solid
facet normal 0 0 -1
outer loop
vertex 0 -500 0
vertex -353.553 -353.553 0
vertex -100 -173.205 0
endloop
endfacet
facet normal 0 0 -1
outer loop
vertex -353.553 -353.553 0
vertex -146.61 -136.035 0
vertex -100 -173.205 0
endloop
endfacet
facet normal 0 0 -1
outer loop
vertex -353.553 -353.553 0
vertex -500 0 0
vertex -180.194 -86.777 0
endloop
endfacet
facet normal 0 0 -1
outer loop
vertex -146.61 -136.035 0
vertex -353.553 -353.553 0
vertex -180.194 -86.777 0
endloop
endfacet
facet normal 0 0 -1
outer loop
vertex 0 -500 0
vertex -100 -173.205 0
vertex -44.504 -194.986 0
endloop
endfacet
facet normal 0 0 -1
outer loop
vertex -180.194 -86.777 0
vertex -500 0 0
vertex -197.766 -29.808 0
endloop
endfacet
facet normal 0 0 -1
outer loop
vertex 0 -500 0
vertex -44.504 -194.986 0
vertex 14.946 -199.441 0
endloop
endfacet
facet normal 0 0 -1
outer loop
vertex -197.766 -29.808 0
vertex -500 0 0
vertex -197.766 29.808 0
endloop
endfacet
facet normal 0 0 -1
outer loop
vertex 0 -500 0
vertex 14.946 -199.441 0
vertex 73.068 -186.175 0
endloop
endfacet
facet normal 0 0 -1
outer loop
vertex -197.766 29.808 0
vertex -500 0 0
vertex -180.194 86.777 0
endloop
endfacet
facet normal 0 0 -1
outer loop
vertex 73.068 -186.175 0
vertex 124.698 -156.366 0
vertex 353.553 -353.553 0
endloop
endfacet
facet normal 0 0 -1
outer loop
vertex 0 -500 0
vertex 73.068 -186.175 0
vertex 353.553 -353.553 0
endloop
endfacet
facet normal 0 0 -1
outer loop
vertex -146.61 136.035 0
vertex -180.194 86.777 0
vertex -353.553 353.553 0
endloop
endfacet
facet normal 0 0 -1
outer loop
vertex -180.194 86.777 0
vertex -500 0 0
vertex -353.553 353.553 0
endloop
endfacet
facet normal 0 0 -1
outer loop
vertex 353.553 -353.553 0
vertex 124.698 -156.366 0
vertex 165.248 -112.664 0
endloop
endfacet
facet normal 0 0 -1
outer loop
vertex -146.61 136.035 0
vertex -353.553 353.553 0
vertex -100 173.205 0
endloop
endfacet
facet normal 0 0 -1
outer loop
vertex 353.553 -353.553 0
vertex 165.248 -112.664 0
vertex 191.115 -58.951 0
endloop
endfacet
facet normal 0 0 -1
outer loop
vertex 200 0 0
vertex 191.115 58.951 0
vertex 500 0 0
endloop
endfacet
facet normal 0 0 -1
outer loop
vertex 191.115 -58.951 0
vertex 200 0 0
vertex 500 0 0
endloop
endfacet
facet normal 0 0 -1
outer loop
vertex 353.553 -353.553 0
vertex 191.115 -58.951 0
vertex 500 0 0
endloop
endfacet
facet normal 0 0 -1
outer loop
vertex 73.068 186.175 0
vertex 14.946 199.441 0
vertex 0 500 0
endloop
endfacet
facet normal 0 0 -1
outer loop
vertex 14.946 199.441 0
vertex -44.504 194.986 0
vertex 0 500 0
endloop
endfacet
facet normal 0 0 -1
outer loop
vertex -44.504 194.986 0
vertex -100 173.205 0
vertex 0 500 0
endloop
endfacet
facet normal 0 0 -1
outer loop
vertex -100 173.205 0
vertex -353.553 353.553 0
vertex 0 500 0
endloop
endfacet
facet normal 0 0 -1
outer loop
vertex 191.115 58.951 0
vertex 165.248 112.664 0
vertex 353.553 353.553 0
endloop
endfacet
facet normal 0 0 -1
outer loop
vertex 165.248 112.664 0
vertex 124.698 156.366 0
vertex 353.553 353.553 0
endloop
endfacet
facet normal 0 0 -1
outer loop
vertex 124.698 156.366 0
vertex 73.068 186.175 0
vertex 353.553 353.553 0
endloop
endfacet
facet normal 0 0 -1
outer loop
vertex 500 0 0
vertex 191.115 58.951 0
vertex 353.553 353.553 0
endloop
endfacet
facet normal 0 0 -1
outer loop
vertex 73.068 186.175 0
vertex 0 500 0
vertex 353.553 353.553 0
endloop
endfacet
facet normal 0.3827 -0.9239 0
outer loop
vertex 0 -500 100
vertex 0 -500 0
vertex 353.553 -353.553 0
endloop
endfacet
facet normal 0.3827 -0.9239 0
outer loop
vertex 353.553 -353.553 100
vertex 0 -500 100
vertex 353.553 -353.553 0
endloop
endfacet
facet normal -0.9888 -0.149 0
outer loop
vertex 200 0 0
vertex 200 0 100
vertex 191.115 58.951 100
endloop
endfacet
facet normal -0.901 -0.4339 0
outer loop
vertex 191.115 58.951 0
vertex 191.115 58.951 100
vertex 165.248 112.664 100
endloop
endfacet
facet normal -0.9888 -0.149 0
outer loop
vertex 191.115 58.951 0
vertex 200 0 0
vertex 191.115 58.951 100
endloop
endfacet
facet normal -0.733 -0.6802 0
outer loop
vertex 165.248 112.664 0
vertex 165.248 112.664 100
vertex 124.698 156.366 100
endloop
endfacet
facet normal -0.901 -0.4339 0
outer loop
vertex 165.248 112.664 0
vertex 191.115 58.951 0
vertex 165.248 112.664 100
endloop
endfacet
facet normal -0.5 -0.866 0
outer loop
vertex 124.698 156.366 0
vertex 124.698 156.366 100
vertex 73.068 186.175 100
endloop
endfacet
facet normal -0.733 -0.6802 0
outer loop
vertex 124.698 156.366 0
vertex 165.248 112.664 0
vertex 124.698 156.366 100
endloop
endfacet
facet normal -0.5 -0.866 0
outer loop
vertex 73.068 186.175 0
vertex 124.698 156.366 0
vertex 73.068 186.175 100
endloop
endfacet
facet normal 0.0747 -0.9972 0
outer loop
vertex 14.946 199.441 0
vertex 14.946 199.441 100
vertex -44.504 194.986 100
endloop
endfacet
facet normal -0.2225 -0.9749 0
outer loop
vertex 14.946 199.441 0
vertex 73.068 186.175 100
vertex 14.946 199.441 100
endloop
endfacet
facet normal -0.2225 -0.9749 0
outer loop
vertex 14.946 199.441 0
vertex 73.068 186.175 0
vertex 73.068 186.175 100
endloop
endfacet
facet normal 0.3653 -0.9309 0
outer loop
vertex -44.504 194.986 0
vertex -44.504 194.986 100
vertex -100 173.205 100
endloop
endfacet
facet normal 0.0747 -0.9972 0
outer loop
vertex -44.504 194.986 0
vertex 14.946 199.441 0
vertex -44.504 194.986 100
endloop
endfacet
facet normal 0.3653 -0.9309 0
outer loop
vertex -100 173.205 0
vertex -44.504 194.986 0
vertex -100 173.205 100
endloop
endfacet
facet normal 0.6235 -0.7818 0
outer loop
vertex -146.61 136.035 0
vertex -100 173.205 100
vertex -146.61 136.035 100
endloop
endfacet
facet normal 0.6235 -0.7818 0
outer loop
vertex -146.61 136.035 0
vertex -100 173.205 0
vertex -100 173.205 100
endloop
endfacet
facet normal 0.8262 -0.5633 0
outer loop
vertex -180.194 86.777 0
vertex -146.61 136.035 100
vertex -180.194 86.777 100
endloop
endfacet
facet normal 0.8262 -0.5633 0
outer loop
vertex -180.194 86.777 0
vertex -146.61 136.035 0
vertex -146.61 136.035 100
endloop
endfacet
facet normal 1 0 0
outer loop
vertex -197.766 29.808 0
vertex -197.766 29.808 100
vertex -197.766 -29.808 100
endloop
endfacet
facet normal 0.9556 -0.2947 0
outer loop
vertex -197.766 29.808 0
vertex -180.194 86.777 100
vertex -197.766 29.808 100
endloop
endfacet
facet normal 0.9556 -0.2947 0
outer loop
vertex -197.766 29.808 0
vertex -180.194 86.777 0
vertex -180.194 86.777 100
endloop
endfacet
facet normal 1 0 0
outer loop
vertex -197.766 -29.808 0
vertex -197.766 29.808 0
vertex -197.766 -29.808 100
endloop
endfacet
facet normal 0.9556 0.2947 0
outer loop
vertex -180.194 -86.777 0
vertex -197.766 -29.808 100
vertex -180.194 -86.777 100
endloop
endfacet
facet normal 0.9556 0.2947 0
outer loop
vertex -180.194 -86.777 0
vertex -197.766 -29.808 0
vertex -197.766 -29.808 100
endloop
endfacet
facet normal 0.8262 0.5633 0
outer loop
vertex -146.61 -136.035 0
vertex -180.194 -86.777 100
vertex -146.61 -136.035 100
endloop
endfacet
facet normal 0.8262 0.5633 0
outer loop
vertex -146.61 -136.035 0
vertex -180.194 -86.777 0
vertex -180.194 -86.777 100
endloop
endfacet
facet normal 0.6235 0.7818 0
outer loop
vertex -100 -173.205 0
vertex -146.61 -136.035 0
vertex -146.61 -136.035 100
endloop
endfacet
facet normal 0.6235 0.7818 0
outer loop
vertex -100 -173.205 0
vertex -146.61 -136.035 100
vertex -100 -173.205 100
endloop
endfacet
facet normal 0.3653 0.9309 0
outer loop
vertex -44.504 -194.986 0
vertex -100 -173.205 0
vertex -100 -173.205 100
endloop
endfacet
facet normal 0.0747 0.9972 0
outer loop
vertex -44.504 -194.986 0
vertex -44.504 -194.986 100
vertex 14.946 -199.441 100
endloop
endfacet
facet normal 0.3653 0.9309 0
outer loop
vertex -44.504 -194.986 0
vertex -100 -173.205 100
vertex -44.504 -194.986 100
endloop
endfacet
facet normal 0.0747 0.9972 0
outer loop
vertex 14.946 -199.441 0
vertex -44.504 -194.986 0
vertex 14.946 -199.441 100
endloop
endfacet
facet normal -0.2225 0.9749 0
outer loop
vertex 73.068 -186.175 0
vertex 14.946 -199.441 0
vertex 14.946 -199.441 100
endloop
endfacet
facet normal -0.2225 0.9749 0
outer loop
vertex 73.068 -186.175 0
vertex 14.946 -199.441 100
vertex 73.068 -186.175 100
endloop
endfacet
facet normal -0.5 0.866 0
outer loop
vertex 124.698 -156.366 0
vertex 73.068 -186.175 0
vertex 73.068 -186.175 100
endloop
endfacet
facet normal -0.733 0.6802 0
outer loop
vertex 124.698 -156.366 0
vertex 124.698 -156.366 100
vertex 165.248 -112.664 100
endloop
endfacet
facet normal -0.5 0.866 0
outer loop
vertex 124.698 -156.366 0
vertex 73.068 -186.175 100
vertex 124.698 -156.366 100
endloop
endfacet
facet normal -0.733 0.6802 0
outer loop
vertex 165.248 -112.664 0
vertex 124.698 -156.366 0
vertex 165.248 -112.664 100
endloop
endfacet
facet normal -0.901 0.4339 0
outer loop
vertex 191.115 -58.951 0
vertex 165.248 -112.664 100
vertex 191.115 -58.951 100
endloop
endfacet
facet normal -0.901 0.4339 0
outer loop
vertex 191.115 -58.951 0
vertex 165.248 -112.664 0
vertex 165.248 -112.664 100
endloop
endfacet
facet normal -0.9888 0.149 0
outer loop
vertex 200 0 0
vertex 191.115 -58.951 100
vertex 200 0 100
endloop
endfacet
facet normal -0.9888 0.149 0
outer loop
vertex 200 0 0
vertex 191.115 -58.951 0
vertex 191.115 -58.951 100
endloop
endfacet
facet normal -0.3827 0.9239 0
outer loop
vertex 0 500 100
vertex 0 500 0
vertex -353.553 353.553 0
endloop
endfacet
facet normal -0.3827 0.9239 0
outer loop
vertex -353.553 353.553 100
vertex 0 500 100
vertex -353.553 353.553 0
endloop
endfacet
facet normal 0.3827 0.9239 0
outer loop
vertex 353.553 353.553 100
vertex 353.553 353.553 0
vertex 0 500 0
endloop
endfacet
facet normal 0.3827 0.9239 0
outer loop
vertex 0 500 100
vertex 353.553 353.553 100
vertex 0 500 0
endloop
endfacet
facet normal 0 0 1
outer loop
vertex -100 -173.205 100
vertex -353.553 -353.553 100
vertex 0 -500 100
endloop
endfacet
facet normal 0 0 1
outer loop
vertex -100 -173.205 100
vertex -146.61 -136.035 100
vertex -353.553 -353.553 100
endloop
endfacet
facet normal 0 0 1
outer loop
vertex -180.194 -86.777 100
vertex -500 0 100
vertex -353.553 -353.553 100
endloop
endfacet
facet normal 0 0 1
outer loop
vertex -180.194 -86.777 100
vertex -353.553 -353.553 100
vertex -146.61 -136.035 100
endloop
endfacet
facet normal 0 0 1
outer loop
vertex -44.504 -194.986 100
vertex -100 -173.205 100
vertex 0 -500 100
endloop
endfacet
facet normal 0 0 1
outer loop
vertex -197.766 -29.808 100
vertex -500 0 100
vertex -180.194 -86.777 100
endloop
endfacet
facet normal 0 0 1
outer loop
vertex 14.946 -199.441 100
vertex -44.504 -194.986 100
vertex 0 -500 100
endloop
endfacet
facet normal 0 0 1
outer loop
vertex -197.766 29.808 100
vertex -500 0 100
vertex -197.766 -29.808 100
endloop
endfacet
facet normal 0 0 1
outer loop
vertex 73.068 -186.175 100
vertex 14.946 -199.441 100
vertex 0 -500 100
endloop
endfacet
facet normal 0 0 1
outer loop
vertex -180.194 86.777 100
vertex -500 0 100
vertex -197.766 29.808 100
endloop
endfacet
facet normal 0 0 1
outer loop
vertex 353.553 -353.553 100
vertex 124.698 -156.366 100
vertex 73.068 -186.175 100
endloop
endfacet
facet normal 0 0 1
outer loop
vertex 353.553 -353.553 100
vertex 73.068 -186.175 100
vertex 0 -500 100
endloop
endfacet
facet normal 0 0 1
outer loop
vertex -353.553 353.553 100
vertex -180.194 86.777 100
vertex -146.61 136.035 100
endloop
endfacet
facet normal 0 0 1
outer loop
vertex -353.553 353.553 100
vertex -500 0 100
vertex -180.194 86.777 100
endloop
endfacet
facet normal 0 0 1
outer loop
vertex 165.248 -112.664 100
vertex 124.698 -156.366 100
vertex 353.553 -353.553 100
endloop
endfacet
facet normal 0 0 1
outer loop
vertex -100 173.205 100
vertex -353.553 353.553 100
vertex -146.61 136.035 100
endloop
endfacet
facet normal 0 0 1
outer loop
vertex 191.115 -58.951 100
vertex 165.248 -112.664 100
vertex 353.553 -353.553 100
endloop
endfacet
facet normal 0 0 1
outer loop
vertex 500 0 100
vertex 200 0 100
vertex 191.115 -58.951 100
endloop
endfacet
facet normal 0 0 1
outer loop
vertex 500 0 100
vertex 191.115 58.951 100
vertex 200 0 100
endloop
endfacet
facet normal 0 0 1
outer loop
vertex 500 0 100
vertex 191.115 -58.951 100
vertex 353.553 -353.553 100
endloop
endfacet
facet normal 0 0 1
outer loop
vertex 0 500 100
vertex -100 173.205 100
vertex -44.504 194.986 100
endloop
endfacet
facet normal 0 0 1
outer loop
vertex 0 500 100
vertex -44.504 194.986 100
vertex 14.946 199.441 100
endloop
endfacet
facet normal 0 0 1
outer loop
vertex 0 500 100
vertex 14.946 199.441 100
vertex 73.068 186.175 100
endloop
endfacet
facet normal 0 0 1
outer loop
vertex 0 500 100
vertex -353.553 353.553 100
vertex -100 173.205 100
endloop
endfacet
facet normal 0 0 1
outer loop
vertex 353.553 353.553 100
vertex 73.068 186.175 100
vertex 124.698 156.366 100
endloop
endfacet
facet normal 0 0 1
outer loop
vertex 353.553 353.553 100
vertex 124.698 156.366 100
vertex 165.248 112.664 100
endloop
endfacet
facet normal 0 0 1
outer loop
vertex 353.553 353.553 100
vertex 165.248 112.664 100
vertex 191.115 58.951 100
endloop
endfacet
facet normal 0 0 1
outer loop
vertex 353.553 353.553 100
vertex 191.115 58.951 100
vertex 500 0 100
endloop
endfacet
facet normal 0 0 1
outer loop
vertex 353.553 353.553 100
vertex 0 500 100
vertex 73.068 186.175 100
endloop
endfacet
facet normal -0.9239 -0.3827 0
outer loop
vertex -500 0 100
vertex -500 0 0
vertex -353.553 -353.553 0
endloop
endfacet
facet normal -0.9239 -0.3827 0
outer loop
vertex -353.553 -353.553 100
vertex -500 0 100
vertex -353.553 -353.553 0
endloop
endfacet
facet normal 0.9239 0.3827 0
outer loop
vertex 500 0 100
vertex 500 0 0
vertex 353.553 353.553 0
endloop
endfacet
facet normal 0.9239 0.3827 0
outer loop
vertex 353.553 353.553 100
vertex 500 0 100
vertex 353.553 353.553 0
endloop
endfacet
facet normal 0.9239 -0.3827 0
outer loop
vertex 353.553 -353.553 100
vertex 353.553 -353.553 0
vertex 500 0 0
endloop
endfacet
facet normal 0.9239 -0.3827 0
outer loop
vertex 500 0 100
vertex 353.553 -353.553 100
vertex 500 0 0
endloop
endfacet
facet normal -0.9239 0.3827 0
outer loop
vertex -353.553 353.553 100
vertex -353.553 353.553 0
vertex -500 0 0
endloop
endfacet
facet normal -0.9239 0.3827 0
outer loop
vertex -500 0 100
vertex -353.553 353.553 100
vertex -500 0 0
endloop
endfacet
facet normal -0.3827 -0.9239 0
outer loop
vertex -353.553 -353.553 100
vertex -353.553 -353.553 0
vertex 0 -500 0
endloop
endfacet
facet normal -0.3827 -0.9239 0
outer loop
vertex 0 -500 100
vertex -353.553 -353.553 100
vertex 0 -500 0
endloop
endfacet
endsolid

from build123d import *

# Parameters (mm, degrees)
EXTRUDE_1_DEPTH     = 100
SKETCH_2_R          = 200
CUT_EXTRUDE_2_DEPTH = 715.142842854


with BuildPart() as part:
    # 草图1 → 凸台-拉伸1 (new body)
    with BuildSketch(Plane.XY):
        Polygon((500, 0), (353.553390593, 353.553390593), (0, 500), (-353.553390593, 353.553390593), (-500, 0), (-353.553390593, -353.553390593), (0, -500), (353.553390593, -353.553390593), align=None)
    extrude(amount=EXTRUDE_1_DEPTH)

    # 草图2 → 切除-拉伸2 (cut, through all)
    with BuildSketch(Plane.XY):
        Circle(SKETCH_2_R)
    extrude(amount=CUT_EXTRUDE_2_DEPTH, mode=Mode.SUBTRACT)


solid = part.part
